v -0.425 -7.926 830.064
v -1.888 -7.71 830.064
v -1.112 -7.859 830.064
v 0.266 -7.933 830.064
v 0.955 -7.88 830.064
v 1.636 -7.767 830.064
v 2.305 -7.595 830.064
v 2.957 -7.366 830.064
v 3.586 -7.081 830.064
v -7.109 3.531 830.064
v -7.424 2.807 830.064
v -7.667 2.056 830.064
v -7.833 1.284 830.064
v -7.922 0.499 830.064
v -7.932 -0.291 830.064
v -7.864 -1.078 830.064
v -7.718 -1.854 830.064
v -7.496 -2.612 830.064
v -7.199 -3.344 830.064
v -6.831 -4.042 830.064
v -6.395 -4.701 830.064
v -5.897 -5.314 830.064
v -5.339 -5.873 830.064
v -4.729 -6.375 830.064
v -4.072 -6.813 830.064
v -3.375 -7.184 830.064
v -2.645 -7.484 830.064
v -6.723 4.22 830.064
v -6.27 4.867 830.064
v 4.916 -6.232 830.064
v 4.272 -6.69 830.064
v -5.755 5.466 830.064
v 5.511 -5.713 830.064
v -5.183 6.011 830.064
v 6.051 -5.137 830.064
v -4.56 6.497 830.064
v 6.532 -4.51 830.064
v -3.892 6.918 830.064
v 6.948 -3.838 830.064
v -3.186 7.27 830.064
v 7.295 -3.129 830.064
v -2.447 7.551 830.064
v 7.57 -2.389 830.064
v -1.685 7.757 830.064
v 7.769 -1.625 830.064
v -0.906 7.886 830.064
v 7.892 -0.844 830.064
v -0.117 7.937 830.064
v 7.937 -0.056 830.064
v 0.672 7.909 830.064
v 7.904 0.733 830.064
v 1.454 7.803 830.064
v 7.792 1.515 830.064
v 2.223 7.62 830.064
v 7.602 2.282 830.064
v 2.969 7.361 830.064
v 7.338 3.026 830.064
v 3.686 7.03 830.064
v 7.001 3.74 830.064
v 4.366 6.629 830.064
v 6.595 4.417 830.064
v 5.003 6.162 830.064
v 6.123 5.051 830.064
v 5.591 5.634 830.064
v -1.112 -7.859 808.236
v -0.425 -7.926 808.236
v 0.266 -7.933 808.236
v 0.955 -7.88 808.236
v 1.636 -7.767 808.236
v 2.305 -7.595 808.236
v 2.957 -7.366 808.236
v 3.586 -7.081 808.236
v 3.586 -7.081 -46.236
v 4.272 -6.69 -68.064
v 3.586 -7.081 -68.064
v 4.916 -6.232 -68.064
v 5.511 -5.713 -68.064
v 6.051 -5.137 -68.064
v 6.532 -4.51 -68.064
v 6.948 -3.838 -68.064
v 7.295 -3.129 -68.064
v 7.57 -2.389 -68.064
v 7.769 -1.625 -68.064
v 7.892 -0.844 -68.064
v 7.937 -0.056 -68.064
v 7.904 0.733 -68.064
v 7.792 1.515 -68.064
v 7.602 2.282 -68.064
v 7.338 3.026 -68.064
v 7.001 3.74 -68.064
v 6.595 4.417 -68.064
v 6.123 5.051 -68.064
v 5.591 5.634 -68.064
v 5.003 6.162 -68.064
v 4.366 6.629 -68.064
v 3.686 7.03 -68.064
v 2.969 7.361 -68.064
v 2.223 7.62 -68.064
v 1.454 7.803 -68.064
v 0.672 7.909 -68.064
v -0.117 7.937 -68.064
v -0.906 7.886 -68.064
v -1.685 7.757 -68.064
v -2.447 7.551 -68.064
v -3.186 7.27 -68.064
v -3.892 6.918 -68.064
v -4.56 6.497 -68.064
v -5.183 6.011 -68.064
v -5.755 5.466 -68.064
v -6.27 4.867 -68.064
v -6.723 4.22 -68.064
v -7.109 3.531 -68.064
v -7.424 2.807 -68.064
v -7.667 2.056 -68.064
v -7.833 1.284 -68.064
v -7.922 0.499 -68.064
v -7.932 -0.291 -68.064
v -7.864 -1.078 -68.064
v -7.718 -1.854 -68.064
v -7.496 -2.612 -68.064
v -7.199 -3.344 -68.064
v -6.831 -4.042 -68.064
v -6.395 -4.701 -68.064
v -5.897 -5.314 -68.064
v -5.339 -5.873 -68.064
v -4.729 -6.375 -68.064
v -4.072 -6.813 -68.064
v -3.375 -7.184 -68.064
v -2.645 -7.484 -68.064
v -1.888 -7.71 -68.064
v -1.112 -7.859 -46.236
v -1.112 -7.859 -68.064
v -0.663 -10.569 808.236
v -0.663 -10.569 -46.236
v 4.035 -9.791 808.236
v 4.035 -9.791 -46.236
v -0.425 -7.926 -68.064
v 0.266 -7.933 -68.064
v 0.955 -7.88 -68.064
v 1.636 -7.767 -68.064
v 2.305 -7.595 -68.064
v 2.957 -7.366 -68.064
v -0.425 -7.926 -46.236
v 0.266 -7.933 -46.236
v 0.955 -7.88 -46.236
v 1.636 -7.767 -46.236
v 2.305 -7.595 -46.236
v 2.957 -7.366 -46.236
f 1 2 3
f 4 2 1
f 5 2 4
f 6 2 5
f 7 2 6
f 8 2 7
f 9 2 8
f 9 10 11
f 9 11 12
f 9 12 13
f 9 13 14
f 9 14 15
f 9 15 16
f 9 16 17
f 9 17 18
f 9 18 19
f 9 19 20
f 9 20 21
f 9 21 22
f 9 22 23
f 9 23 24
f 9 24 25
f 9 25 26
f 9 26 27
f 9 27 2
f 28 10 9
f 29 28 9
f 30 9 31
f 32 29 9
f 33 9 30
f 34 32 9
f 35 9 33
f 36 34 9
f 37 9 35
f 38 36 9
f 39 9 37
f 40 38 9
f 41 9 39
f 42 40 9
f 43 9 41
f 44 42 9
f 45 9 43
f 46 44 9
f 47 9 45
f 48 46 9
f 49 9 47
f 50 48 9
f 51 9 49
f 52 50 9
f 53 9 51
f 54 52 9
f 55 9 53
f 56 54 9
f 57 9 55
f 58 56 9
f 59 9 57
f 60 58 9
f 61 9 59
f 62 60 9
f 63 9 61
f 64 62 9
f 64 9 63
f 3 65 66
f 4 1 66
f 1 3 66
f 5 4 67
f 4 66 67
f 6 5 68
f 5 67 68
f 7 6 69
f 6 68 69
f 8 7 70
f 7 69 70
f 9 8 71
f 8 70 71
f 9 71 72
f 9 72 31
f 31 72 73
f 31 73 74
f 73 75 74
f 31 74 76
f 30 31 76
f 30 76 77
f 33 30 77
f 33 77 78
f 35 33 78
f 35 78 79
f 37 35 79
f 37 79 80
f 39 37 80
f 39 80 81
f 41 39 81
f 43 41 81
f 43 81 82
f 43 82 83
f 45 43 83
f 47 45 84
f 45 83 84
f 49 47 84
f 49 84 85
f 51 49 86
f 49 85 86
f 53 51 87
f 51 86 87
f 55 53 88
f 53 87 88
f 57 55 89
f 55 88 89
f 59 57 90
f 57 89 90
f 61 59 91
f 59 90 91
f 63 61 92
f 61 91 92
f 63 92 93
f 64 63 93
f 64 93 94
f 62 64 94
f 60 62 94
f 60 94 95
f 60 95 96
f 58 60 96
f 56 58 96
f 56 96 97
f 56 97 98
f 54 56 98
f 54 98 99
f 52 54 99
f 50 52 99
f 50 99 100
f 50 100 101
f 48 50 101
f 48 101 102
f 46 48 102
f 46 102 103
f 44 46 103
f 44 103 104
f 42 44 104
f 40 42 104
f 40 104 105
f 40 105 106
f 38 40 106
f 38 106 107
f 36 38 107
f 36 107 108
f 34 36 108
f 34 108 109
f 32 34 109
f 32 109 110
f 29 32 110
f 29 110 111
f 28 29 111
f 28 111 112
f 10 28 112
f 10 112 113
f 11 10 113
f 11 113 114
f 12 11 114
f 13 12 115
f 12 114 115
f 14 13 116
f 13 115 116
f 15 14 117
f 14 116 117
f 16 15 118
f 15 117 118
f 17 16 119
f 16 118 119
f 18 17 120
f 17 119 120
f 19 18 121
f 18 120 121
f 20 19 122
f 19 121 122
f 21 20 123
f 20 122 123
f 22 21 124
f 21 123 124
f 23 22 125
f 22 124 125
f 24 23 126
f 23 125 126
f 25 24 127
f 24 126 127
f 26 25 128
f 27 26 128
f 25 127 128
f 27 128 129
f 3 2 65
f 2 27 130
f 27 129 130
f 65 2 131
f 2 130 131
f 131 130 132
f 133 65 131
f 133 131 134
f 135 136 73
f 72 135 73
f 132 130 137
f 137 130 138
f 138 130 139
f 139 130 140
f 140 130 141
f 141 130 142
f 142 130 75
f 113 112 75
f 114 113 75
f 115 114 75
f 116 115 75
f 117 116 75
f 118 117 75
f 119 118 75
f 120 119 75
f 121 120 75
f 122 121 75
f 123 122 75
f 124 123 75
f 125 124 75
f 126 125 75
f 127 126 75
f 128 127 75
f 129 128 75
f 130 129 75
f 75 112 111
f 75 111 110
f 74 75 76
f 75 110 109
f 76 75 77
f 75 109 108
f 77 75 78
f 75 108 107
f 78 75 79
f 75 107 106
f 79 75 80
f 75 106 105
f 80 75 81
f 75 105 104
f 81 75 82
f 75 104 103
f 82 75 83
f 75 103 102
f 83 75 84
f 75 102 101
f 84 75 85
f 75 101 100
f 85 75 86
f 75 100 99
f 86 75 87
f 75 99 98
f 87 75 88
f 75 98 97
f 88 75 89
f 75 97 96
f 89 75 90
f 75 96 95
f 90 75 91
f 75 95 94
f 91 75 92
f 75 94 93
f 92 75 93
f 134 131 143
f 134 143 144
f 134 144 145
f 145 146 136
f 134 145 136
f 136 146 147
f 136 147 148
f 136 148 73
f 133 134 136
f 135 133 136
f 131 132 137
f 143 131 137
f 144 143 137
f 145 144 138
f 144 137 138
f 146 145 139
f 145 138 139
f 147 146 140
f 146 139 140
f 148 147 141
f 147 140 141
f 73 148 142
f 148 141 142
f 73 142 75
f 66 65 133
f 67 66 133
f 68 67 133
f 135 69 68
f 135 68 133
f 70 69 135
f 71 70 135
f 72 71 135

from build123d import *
from OCP.BRepAlgoAPI import BRepAlgoAPI_Cut
from OCP.TopTools import TopTools_ListOfShape

# Parameters (mm, degrees)
BOSS_EXTRUDE1_START = -68.064063
BOSS_EXTRUDE1_DEPTH = 898.128125
CUT_EXTRUDE1_START  = -21.828125
SKETCH2_R           = 10.589945851
SKETCH2_R_2         = 7.9375
CUT_EXTRUDE1_DEPTH  = 21.828125
CUT_EXTRUDE2_START  = -898.128125
SKETCH2_2_R         = 10.589945851
SKETCH2_2_R_2       = 7.9375
CUT_EXTRUDE2_DEPTH  = 21.828125


with BuildPart() as part:
    # Sketch1 → Boss-Extrude1 (new body)
    with BuildSketch(Plane.XY.offset(BOSS_EXTRUDE1_START)):
        with BuildLine():
            Line((4.035093565, -9.791065981), (3.586322342, -7.081115612))
            ThreePointArc((3.586322342, -7.081115612), (-1.296798787, 7.830850475), (-1.112187943, -7.859194884))
            Line((-1.112187943, -7.859194884), (-0.663416719, -10.569145253))
            Line((-0.663416719, -10.569145253), (4.035093565, -9.791065981))
        make_face()
    extrude(amount=BOSS_EXTRUDE1_DEPTH)

    # Sketch2 → Cut-Extrude1 (cut)
    with BuildSketch(Plane.XY.offset(830.0640625).offset(CUT_EXTRUDE1_START)):
        Circle(SKETCH2_R)
        with Locations(Location((0, 0, 0), (0, 0, 261.945315936))):
            Circle(SKETCH2_R_2, mode=Mode.SUBTRACT)
    extrude(amount=CUT_EXTRUDE1_DEPTH, mode=Mode.SUBTRACT)


with BuildPart() as cut_extrude2_tool:
    # Sketch2<2> → Cut-Extrude2 (new body)
    with BuildSketch(Plane.XY.offset(830.0640625).offset(CUT_EXTRUDE2_START)):
        Circle(SKETCH2_2_R)
        with Locations(Location((0, 0, 0), (0, 0, 180))):
            Circle(SKETCH2_2_R_2, mode=Mode.SUBTRACT)
    extrude(amount=CUT_EXTRUDE2_DEPTH)


with BuildPart() as part_1:
    add(part.part)

    # Cut-Extrude2: cut by cut_extrude2_tool, with a tolerance
    cut_extrude2_stock = TopTools_ListOfShape()
    cut_extrude2_stock.Append(part_1.part.wrapped)
    cut_extrude2_tools = TopTools_ListOfShape()
    cut_extrude2_tools.Append(cut_extrude2_tool.part.wrapped)
    cut_extrude2_cut = BRepAlgoAPI_Cut()
    cut_extrude2_cut.SetArguments(cut_extrude2_stock)
    cut_extrude2_cut.SetTools(cut_extrude2_tools)
    cut_extrude2_cut.SetFuzzyValue(0.00001)
    cut_extrude2_cut.Build()
    add(Compound.cast(cut_extrude2_cut.Shape()).solids(), mode=Mode.REPLACE)


solid = part_1.part
